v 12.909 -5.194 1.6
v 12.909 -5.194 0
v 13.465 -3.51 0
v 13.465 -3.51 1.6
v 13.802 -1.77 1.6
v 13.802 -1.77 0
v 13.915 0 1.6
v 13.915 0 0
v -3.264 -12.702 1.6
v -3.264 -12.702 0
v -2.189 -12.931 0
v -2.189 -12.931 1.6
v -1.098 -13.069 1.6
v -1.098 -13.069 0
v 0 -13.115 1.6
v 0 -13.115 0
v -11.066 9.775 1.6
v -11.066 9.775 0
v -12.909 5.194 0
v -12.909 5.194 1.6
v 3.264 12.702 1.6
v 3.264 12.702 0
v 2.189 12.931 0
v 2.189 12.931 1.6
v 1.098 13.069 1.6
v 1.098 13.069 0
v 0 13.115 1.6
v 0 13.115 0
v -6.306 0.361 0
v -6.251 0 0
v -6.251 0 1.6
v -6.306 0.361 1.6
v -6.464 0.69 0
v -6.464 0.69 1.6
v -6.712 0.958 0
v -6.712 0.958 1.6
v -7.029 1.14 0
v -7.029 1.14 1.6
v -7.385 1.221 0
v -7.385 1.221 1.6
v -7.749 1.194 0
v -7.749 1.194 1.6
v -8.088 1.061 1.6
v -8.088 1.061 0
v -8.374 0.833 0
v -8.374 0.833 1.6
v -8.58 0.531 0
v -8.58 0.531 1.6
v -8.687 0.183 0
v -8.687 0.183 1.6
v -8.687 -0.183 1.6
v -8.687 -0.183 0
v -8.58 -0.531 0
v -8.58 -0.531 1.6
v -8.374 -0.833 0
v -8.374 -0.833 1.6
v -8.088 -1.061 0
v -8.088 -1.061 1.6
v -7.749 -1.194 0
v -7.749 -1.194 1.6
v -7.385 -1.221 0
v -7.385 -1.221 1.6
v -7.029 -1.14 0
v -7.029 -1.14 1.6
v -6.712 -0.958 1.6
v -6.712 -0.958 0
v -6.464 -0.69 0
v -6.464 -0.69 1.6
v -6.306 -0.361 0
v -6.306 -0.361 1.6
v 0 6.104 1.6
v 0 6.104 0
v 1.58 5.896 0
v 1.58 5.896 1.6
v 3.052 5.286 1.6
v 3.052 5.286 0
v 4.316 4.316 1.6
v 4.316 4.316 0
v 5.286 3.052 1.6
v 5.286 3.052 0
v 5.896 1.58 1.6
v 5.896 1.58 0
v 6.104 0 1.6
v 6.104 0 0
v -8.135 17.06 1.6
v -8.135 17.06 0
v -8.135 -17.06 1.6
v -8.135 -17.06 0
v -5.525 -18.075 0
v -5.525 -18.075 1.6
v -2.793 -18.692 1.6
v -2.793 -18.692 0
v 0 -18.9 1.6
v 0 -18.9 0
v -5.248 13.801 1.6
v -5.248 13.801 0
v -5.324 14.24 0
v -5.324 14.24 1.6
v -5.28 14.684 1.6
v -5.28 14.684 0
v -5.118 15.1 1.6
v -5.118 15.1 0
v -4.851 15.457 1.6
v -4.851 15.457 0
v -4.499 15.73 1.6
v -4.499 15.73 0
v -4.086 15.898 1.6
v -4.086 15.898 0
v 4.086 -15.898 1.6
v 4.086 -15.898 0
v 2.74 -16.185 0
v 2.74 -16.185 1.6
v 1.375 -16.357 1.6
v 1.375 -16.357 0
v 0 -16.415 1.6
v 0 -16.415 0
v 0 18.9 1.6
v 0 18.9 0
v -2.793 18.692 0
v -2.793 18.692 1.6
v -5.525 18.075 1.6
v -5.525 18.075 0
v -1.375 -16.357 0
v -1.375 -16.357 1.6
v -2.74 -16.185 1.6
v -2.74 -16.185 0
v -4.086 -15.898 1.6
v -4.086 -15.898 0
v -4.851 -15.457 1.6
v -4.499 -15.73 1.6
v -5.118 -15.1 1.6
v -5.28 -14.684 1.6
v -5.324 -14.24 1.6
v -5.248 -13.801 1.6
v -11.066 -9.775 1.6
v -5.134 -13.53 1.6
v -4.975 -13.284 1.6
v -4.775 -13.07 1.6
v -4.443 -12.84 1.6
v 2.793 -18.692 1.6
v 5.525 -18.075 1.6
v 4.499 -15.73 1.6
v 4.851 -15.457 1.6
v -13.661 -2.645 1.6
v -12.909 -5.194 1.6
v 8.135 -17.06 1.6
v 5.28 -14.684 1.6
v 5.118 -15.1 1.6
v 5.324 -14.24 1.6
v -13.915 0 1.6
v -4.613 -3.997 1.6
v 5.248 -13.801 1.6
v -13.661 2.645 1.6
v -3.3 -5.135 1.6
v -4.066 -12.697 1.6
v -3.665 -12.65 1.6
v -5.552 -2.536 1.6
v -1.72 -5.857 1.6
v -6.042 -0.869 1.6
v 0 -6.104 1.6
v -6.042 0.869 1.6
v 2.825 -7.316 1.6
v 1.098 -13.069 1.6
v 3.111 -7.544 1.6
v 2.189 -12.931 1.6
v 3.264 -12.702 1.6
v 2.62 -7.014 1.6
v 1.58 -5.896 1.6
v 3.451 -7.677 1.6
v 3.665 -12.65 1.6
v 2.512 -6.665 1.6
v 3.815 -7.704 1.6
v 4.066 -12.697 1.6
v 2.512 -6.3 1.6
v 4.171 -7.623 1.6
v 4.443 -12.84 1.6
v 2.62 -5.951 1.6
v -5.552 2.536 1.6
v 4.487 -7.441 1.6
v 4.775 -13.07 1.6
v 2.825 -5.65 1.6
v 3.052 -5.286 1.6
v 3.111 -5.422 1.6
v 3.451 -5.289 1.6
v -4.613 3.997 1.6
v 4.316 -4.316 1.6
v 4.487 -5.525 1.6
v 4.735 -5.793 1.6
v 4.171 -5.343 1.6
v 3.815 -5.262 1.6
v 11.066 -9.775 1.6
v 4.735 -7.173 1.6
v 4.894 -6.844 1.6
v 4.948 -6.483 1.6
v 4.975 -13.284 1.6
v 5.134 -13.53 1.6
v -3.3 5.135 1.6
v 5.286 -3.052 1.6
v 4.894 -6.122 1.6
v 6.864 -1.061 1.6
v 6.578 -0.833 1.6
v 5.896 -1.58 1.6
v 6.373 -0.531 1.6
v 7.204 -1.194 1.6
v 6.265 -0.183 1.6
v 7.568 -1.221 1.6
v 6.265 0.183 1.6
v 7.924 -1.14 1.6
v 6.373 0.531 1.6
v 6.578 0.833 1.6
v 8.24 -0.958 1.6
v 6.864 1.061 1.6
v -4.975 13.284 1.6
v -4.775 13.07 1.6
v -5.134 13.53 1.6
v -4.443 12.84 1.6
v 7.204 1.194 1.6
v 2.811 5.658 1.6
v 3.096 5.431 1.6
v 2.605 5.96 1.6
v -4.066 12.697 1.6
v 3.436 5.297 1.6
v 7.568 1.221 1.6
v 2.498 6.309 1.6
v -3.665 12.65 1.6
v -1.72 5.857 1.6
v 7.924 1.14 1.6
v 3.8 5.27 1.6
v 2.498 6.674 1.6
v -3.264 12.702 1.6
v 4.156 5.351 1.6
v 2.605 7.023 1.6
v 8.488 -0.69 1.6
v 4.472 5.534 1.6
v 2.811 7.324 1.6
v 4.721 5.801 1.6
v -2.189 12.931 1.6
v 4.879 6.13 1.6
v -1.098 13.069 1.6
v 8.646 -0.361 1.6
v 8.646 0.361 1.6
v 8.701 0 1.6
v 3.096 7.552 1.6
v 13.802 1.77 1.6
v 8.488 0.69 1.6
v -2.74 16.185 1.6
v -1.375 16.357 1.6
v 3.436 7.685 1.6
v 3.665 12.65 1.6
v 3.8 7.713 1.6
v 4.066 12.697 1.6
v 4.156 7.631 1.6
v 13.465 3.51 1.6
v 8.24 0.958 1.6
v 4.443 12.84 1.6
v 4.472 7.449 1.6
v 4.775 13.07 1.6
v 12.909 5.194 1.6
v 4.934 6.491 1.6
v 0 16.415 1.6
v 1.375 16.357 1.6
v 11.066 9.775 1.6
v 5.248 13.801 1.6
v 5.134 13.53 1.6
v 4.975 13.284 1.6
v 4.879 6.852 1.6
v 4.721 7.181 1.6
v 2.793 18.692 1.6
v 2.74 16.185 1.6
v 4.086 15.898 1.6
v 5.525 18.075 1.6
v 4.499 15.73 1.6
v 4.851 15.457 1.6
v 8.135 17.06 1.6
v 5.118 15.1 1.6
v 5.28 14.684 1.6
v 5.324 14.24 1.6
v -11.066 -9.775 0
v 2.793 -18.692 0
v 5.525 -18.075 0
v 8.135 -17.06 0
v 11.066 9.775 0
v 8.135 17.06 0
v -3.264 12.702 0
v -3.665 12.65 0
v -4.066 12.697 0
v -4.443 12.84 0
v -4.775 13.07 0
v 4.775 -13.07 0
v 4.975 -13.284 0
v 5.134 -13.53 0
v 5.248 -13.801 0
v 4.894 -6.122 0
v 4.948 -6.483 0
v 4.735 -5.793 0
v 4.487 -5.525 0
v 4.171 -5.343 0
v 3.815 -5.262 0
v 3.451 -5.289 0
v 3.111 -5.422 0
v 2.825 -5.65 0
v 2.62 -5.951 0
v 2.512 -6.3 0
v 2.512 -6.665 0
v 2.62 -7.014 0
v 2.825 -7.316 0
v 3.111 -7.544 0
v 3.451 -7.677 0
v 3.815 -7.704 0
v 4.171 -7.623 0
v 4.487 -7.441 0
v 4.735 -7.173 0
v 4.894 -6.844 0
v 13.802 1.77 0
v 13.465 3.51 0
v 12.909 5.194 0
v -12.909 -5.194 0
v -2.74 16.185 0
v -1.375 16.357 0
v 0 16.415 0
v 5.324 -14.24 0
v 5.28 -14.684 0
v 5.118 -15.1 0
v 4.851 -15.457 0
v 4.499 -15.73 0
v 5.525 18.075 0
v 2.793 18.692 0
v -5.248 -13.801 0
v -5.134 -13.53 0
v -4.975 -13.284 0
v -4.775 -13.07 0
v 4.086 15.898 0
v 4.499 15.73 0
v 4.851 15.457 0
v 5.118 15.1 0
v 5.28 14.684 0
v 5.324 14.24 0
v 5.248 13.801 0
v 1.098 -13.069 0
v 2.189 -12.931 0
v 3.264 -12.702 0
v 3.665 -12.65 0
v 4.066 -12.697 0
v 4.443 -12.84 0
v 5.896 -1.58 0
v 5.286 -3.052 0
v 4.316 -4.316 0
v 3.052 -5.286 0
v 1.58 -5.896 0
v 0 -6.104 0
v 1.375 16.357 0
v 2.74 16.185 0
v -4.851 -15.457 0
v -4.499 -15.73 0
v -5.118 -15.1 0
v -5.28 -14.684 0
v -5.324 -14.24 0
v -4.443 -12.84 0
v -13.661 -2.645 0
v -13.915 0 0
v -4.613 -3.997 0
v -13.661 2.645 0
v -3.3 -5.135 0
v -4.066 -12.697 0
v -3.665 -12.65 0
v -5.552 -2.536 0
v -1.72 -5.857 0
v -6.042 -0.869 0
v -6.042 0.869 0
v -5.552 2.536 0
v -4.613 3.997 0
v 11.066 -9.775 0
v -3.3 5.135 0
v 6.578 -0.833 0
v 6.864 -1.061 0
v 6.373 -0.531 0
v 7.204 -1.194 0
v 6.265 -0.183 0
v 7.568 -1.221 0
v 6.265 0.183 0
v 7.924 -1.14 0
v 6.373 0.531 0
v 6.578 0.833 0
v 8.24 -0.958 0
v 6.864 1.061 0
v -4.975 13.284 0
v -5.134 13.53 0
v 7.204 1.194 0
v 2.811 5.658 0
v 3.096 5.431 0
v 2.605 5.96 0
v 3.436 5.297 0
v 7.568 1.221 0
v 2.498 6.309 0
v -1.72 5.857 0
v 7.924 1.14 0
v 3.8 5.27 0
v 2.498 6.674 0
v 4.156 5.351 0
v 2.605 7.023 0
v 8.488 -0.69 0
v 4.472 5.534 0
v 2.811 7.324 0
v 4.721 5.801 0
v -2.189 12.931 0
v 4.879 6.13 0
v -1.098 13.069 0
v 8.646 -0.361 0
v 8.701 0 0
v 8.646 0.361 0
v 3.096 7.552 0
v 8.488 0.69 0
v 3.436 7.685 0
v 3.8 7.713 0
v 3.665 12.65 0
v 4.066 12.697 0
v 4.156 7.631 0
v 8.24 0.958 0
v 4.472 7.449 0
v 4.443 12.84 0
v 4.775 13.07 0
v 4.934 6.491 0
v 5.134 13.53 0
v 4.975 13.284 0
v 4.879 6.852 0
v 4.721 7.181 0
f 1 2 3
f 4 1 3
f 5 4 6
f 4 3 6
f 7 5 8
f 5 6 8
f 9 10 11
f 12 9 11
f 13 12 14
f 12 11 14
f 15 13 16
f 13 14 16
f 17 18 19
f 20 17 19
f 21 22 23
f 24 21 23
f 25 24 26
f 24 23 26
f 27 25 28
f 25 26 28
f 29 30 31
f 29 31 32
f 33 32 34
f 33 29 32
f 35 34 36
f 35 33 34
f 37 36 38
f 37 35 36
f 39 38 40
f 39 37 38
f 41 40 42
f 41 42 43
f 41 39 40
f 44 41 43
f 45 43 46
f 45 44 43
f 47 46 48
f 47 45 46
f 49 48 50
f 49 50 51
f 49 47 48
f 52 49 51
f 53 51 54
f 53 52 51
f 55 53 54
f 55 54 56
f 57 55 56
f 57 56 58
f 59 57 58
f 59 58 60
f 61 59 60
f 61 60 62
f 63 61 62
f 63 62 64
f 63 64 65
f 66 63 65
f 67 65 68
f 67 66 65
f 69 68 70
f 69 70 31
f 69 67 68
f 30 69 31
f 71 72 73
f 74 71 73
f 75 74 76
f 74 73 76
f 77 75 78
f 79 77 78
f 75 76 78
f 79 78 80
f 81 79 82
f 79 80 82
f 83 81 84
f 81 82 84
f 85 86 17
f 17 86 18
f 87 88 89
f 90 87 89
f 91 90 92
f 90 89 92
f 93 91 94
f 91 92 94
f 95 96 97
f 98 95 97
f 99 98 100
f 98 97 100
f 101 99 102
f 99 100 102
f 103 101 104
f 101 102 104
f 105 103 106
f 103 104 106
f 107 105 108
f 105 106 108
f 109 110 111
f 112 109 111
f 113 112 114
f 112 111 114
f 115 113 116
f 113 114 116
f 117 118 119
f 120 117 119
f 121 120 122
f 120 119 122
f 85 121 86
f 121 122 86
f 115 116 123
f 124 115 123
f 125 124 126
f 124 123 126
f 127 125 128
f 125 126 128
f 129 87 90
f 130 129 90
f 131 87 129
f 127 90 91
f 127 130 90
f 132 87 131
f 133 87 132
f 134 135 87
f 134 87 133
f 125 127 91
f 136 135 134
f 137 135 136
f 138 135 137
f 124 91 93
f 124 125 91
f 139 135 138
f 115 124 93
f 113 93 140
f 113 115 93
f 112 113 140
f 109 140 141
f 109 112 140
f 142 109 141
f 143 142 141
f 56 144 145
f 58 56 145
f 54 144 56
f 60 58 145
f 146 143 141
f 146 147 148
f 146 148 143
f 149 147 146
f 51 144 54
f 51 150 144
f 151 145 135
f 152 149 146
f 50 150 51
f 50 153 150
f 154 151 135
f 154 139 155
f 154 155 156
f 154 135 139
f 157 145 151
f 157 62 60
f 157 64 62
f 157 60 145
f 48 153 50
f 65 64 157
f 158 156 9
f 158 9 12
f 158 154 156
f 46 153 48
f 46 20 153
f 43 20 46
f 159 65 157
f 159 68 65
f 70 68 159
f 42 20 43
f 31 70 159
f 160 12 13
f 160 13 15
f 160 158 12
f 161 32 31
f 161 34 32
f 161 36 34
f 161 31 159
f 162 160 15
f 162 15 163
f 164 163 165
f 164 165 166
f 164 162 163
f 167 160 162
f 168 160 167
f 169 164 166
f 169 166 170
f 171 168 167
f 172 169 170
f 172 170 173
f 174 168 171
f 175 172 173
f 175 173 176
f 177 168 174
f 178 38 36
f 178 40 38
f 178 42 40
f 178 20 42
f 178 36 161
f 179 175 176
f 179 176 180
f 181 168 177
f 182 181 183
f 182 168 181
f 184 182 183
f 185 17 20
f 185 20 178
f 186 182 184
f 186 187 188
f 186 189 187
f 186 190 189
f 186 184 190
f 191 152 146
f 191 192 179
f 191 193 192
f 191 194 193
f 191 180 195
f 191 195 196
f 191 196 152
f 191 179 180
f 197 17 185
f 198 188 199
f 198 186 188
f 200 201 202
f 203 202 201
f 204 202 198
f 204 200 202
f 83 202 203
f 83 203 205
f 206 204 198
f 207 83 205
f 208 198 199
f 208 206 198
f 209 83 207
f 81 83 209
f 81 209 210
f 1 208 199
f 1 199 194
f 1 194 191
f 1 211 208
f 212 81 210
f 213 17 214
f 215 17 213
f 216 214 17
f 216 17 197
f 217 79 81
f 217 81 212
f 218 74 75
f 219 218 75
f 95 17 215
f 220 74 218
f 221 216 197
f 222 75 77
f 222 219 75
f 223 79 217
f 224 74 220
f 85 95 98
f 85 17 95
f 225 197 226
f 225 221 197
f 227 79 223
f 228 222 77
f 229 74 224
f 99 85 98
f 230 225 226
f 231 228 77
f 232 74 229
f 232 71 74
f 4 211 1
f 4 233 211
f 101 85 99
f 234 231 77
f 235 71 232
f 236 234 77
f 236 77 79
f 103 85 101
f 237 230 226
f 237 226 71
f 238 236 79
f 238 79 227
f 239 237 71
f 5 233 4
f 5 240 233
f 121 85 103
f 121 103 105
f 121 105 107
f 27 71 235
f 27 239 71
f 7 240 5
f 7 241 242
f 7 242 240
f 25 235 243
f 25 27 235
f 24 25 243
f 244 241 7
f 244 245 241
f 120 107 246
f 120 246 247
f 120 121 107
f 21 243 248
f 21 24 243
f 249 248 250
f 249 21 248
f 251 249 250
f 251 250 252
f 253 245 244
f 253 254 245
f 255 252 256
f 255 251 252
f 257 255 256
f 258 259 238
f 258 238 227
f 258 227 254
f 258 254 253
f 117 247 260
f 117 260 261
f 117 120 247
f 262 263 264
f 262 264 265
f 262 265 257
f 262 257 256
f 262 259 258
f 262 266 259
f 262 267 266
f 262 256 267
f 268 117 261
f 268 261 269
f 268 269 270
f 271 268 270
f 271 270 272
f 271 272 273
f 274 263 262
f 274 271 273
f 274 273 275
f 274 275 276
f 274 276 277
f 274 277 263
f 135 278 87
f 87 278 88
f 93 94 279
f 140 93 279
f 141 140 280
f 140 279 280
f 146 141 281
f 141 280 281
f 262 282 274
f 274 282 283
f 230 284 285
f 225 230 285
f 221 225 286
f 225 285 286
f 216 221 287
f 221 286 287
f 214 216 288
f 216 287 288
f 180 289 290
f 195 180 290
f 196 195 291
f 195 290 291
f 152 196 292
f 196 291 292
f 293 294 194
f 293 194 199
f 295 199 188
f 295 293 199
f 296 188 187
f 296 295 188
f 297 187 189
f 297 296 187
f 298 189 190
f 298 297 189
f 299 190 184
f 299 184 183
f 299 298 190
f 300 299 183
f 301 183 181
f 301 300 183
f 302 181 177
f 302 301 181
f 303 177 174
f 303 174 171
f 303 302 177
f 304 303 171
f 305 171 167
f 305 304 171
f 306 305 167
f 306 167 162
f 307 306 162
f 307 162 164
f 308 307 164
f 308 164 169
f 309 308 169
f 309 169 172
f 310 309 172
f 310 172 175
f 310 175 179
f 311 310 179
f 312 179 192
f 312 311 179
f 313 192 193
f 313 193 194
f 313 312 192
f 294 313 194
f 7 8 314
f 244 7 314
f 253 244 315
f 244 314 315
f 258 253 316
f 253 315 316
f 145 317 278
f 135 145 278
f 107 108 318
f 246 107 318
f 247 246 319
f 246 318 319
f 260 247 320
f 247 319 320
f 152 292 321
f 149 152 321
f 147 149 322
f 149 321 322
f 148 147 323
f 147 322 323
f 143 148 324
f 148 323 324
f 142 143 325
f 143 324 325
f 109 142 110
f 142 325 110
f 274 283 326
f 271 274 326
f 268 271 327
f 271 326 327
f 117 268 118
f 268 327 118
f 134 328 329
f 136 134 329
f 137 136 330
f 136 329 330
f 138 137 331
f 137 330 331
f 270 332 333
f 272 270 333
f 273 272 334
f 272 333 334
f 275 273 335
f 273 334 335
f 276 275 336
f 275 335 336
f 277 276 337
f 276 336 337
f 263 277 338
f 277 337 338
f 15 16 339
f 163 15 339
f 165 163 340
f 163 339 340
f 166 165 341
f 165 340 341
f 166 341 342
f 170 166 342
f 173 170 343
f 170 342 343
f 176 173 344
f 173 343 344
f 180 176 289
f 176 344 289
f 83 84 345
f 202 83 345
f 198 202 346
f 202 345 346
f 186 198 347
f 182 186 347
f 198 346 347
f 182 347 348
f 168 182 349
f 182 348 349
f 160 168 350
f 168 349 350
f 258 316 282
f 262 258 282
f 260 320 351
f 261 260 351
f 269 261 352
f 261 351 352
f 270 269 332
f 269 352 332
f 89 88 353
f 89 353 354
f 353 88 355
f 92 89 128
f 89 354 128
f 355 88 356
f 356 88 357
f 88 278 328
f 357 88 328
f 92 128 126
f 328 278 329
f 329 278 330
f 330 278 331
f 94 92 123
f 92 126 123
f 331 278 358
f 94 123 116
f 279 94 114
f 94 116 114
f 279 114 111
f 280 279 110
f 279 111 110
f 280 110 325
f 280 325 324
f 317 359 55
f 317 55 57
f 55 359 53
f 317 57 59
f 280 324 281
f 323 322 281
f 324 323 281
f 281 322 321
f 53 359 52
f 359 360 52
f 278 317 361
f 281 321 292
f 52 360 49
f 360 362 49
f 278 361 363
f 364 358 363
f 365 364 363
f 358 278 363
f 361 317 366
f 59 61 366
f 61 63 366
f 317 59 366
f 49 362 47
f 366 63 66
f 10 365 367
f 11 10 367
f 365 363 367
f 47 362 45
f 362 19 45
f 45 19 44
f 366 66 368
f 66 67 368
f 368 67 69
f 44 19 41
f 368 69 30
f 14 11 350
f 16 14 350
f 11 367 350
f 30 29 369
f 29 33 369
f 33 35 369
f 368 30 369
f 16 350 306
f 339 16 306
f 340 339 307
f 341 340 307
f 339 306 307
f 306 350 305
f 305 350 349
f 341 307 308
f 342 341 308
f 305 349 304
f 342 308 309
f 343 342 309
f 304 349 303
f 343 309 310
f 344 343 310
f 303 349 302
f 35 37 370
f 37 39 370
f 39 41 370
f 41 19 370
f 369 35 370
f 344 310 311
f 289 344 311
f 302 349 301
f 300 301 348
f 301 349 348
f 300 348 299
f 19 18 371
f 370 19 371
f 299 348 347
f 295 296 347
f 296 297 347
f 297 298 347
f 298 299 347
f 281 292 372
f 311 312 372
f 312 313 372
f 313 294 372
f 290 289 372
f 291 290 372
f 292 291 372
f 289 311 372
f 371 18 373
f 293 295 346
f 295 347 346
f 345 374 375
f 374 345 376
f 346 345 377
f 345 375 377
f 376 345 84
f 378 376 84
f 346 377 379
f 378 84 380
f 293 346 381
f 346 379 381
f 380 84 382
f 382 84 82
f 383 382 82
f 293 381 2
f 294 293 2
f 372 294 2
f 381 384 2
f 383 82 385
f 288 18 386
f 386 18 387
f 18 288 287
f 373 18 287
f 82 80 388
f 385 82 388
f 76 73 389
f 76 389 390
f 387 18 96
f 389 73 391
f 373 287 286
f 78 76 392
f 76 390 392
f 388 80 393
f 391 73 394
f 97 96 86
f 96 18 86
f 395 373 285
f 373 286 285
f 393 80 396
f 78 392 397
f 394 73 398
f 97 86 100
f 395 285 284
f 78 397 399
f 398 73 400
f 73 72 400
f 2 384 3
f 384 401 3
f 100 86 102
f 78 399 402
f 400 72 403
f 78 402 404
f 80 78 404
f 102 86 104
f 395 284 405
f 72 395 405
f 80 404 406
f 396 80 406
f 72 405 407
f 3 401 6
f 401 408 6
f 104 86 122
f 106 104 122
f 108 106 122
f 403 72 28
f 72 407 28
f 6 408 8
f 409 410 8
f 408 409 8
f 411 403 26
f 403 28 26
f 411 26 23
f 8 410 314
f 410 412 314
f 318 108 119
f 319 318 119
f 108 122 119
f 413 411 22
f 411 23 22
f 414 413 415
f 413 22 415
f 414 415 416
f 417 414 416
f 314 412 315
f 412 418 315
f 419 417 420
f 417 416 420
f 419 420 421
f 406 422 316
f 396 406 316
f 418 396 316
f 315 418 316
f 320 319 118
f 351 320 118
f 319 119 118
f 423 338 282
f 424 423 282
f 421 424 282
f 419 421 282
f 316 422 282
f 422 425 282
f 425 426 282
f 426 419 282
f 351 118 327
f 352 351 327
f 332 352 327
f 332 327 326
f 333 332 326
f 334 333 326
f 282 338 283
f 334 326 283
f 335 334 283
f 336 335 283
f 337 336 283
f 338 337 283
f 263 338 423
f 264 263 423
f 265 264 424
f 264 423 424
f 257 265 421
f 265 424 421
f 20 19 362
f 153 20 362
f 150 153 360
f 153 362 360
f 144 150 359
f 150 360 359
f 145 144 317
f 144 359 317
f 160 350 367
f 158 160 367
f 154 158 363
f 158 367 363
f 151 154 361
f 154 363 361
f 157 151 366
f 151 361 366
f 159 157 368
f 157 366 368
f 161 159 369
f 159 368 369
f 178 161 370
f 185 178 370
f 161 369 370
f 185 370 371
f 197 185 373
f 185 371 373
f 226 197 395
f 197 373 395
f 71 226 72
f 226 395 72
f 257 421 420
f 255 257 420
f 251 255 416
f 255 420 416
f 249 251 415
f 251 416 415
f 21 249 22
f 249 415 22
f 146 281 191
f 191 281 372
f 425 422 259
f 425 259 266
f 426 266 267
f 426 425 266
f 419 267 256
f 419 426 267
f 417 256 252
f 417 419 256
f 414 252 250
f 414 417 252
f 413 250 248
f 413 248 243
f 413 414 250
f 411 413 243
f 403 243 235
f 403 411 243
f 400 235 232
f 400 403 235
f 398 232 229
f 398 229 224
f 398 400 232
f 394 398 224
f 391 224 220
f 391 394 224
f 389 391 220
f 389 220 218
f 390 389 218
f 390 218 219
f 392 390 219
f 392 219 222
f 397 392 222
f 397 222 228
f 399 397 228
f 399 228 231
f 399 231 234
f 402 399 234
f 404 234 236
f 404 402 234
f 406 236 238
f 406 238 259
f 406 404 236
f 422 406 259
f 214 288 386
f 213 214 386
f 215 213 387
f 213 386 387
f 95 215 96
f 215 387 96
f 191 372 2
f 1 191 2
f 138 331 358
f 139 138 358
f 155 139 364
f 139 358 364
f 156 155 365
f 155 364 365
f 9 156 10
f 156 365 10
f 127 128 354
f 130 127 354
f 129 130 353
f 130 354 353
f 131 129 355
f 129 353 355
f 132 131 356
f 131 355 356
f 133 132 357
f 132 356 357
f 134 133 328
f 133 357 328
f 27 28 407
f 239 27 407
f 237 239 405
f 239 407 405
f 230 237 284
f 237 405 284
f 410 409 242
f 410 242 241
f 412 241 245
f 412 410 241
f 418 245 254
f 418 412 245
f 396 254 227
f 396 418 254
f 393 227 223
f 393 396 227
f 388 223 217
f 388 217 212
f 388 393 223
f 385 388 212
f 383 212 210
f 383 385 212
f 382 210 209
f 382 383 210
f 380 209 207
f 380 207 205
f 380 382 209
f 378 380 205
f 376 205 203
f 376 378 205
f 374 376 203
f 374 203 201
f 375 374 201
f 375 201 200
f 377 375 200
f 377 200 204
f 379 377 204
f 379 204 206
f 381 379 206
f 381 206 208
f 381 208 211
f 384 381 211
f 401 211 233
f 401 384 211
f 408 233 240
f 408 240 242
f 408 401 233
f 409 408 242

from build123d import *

# Parameters (mm, degrees)
SKETCH2_R           = 1.224840395
BOSS_EXTRUDE1_DEPTH = 1.6


with BuildPart() as part:
    # Sketch2 → Boss-Extrude1 (new body)
    # profile 1 of 12: a face of its own
    with BuildSketch(Plane.XY):
        with BuildLine():
            ThreePointArc((-8.135, -17.059653426), (-4.170284778, -18.434172747), (0, -18.9))
            Line((0, -18.9), (0, -16.415))
            ThreePointArc((0, -16.415), (-2.059106624, -16.285340184), (-4.08568405, -15.898409066))
            ThreePointArc((-4.08568405, -15.898409066), (-5.118317114, -15.09992037), (-5.247629689, -13.801000241))
            ThreePointArc((-5.247629689, -13.801000241), (-8.401661187, -12.141553208), (-11.06618513, -9.774700592))
            Line((-11.06618513, -9.774700592), (-8.135, -17.059653426))
        make_face()
    # profile 2 of 12: a face of its own
    with BuildSketch(Plane.XY):
        with BuildLine():
            Line((0, -16.415), (0, -18.9))
            ThreePointArc((0, -18.9), (4.170284778, -18.434172747), (8.135, -17.059653426))
            Line((8.135, -17.059653426), (11.06618513, -9.774700592))
            ThreePointArc((11.06618513, -9.774700592), (8.401661187, -12.141553208), (5.247629689, -13.801000241))
            ThreePointArc((5.247629689, -13.801000241), (5.118317114, -15.09992037), (4.08568405, -15.898409066))
            ThreePointArc((4.08568405, -15.898409066), (2.059106624, -16.285340184), (0, -16.415))
        make_face()
    # profile 3 of 12: a face of its own
    with BuildSketch(Plane.XY):
        with BuildLine():
            ThreePointArc((5.247629689, -13.801000241), (8.401661187, -12.141553208), (11.06618513, -9.774700592))
            Line((11.06618513, -9.774700592), (12.90921384, -5.194172026))
            ThreePointArc((12.90921384, -5.194172026), (9.679242267, -9.996974249), (4.774656023, -13.070190697))
            ThreePointArc((4.774656023, -13.070190697), (5.060206981, -13.403841589), (5.247629689, -13.801000241))
        make_face()
    # profile 4 of 12: a face of its own
    with BuildSketch(Plane.XY):
        with BuildLine():
            Line((-12.909213852, -5.194171995), (-11.06618513, -9.774700592))
            ThreePointArc((-11.06618513, -9.774700592), (-8.401661187, -12.141553208), (-5.247629689, -13.801000241))
            ThreePointArc((-5.247629689, -13.801000241), (-5.060206981, -13.403841589), (-4.774656023, -13.070190697))
            ThreePointArc((-4.774656023, -13.070190697), (-9.679242279, -9.996974238), (-12.909213852, -5.194171995))
        make_face()
    # profile 5 of 12: a face of its own
    with BuildSketch(Plane.XY):
        with BuildLine():
            ThreePointArc((-12.909213987, 5.194171661), (-13.915, -1.8e-07), (-12.909213852, -5.194171995))
            ThreePointArc((-12.909213852, -5.194171995), (-9.679242279, -9.996974238), (-4.774656023, -13.070190697))
            ThreePointArc((-4.774656023, -13.070190697), (-4.065529678, -12.697217895), (-3.26431595, -12.702262254))
            ThreePointArc((-3.26431595, -12.702262254), (-1.64515281, -13.011406428), (0, -13.115))
            Line((0, -13.115), (0, -10.854127302))
            ThreePointArc((0, -10.854127302), (-10.854127302, 0), (0, 10.854127302))
            Line((0, 10.854127302), (0, 13.115))
            ThreePointArc((0, 13.115), (-1.64515281, 13.011406428), (-3.26431595, 12.702262254))
            ThreePointArc((-3.26431595, 12.702262254), (-4.065529678, 12.697217895), (-4.774656023, 13.070190697))
            ThreePointArc((-4.774656023, 13.070190697), (-9.679242408, 9.996974112), (-12.909213987, 5.194171661))
        make_face()
    # profile 6 of 12: a face of its own
    with BuildSketch(Plane.XY):
        with BuildLine():
            Line((-11.06618513, 9.774700592), (-12.909213987, 5.194171661))
            ThreePointArc((-12.909213987, 5.194171661), (-9.679242408, 9.996974112), (-4.774656023, 13.070190697))
            ThreePointArc((-4.774656023, 13.070190697), (-5.060206981, 13.403841589), (-5.247629689, 13.801000241))
            ThreePointArc((-5.247629689, 13.801000241), (-8.401661187, 12.141553208), (-11.06618513, 9.774700592))
        make_face()
    # profile 7 of 12: a face of its own
    with BuildSketch(Plane.XY):
        with BuildLine():
            Line((-8.135, 17.059653426), (-11.06618513, 9.774700592))
            ThreePointArc((-11.06618513, 9.774700592), (-8.401661187, 12.141553208), (-5.247629689, 13.801000241))
            ThreePointArc((-5.247629689, 13.801000241), (-5.118317114, 15.09992037), (-4.08568405, 15.898409066))
            ThreePointArc((-4.08568405, 15.898409066), (-2.059106624, 16.285340184), (0, 16.415))
            Line((0, 16.415), (0, 18.9))
            ThreePointArc((0, 18.9), (-4.170284778, 18.434172747), (-8.135, 17.059653426))
        make_face()
    # profile 8 of 12: a face of its own
    with BuildSketch(Plane.XY):
        with BuildLine():
            ThreePointArc((4.774656023, 13.070190697), (9.679242519, 9.996974005), (12.909214102, 5.194171376))
            Line((12.909214102, 5.194171376), (11.06618513, 9.774700592))
            ThreePointArc((11.06618513, 9.774700592), (8.401661187, 12.141553208), (5.247629689, 13.801000241))
            ThreePointArc((5.247629689, 13.801000241), (5.060206981, 13.403841589), (4.774656023, 13.070190697))
        make_face()
    # profile 9 of 12: a face of its own
    with BuildSketch(Plane.XY):
        with BuildLine():
            ThreePointArc((4.774656023, -13.070190697), (9.679242267, -9.996974249), (12.90921384, -5.194172026))
            ThreePointArc((12.90921384, -5.194172026), (13.661239614, -2.645327429), (13.915, 0))
            ThreePointArc((13.915, 0), (13.661239681, 2.645327085), (12.909214102, 5.194171376))
            ThreePointArc((12.909214102, 5.194171376), (9.679242519, 9.996974005), (4.774656023, 13.070190697))
            ThreePointArc((4.774656023, 13.070190697), (4.065529678, 12.697217895), (3.26431595, 12.702262254))
            ThreePointArc((3.26431595, 12.702262254), (1.64515281, 13.011406428), (0, 13.115))
            Line((0, 13.115), (0, 10.854127302))
            ThreePointArc((0, 10.854127302), (7.675027019, 7.675027019), (10.854127302, 0))
            ThreePointArc((10.854127302, 0), (7.675027019, -7.675027019), (0, -10.854127302))
            Line((0, -10.854127302), (0, -13.115))
            ThreePointArc((0, -13.115), (1.64515281, -13.011406428), (3.26431595, -12.702262254))
            ThreePointArc((3.26431595, -12.702262254), (4.065529678, -12.697217895), (4.774656023, -13.070190697))
        make_face()
    # profile 10 of 12: a face of its own
    with BuildSketch(Plane.XY):
        with BuildLine():
            ThreePointArc((5.247629689, 13.801000241), (8.401661187, 12.141553208), (11.06618513, 9.774700592))
            Line((11.06618513, 9.774700592), (8.135, 17.059653426))
            ThreePointArc((8.135, 17.059653426), (4.170284778, 18.434172747), (0, 18.9))
            Line((0, 18.9), (0, 16.415))
            ThreePointArc((0, 16.415), (2.059106624, 16.285340184), (4.08568405, 15.898409066))
            ThreePointArc((4.08568405, 15.898409066), (5.118317114, 15.09992037), (5.247629689, 13.801000241))
        make_face()
    # profile 11 of 12: a face of its own
    with BuildSketch(Plane.XY):
        with BuildLine():
            ThreePointArc((0, 10.854127302), (-10.854127302, 0), (0, -10.854127302))
            Line((0, -10.854127302), (0, -6.103787969))
            ThreePointArc((0, -6.103787969), (-6.103787969, 0), (0, 6.103787969))
            Line((0, 6.103787969), (0, 10.854127302))
        make_face()
        with Locations((-7.476059495, 0)):
            Circle(SKETCH2_R, mode=Mode.SUBTRACT)
    # profile 12 of 12: a face of its own
    with BuildSketch(Plane.XY):
        with BuildLine():
            Line((0, -6.103787969), (0, -10.854127302))
            ThreePointArc((0, -10.854127302), (7.675027019, -7.675027019), (10.854127302, 0))
            ThreePointArc((10.854127302, 0), (7.675027019, 7.675027019), (0, 10.854127302))
            Line((0, 10.854127302), (0, 6.103787969))
            ThreePointArc((0, 6.103787969), (4.316029864, 4.316029864), (6.103787969, 0))
            ThreePointArc((6.103787969, 0), (4.316029864, -4.316029864), (0, -6.103787969))
        make_face()
        with Locations((3.72330191, -6.482938258)):
            Circle(SKETCH2_R, mode=Mode.SUBTRACT)
        with Locations((7.476059495, 0)):
            Circle(SKETCH2_R, mode=Mode.SUBTRACT)
        with Locations((3.708670732, 6.491319355)):
            Circle(SKETCH2_R, mode=Mode.SUBTRACT)
    extrude(amount=BOSS_EXTRUDE1_DEPTH)


solid = part.part
